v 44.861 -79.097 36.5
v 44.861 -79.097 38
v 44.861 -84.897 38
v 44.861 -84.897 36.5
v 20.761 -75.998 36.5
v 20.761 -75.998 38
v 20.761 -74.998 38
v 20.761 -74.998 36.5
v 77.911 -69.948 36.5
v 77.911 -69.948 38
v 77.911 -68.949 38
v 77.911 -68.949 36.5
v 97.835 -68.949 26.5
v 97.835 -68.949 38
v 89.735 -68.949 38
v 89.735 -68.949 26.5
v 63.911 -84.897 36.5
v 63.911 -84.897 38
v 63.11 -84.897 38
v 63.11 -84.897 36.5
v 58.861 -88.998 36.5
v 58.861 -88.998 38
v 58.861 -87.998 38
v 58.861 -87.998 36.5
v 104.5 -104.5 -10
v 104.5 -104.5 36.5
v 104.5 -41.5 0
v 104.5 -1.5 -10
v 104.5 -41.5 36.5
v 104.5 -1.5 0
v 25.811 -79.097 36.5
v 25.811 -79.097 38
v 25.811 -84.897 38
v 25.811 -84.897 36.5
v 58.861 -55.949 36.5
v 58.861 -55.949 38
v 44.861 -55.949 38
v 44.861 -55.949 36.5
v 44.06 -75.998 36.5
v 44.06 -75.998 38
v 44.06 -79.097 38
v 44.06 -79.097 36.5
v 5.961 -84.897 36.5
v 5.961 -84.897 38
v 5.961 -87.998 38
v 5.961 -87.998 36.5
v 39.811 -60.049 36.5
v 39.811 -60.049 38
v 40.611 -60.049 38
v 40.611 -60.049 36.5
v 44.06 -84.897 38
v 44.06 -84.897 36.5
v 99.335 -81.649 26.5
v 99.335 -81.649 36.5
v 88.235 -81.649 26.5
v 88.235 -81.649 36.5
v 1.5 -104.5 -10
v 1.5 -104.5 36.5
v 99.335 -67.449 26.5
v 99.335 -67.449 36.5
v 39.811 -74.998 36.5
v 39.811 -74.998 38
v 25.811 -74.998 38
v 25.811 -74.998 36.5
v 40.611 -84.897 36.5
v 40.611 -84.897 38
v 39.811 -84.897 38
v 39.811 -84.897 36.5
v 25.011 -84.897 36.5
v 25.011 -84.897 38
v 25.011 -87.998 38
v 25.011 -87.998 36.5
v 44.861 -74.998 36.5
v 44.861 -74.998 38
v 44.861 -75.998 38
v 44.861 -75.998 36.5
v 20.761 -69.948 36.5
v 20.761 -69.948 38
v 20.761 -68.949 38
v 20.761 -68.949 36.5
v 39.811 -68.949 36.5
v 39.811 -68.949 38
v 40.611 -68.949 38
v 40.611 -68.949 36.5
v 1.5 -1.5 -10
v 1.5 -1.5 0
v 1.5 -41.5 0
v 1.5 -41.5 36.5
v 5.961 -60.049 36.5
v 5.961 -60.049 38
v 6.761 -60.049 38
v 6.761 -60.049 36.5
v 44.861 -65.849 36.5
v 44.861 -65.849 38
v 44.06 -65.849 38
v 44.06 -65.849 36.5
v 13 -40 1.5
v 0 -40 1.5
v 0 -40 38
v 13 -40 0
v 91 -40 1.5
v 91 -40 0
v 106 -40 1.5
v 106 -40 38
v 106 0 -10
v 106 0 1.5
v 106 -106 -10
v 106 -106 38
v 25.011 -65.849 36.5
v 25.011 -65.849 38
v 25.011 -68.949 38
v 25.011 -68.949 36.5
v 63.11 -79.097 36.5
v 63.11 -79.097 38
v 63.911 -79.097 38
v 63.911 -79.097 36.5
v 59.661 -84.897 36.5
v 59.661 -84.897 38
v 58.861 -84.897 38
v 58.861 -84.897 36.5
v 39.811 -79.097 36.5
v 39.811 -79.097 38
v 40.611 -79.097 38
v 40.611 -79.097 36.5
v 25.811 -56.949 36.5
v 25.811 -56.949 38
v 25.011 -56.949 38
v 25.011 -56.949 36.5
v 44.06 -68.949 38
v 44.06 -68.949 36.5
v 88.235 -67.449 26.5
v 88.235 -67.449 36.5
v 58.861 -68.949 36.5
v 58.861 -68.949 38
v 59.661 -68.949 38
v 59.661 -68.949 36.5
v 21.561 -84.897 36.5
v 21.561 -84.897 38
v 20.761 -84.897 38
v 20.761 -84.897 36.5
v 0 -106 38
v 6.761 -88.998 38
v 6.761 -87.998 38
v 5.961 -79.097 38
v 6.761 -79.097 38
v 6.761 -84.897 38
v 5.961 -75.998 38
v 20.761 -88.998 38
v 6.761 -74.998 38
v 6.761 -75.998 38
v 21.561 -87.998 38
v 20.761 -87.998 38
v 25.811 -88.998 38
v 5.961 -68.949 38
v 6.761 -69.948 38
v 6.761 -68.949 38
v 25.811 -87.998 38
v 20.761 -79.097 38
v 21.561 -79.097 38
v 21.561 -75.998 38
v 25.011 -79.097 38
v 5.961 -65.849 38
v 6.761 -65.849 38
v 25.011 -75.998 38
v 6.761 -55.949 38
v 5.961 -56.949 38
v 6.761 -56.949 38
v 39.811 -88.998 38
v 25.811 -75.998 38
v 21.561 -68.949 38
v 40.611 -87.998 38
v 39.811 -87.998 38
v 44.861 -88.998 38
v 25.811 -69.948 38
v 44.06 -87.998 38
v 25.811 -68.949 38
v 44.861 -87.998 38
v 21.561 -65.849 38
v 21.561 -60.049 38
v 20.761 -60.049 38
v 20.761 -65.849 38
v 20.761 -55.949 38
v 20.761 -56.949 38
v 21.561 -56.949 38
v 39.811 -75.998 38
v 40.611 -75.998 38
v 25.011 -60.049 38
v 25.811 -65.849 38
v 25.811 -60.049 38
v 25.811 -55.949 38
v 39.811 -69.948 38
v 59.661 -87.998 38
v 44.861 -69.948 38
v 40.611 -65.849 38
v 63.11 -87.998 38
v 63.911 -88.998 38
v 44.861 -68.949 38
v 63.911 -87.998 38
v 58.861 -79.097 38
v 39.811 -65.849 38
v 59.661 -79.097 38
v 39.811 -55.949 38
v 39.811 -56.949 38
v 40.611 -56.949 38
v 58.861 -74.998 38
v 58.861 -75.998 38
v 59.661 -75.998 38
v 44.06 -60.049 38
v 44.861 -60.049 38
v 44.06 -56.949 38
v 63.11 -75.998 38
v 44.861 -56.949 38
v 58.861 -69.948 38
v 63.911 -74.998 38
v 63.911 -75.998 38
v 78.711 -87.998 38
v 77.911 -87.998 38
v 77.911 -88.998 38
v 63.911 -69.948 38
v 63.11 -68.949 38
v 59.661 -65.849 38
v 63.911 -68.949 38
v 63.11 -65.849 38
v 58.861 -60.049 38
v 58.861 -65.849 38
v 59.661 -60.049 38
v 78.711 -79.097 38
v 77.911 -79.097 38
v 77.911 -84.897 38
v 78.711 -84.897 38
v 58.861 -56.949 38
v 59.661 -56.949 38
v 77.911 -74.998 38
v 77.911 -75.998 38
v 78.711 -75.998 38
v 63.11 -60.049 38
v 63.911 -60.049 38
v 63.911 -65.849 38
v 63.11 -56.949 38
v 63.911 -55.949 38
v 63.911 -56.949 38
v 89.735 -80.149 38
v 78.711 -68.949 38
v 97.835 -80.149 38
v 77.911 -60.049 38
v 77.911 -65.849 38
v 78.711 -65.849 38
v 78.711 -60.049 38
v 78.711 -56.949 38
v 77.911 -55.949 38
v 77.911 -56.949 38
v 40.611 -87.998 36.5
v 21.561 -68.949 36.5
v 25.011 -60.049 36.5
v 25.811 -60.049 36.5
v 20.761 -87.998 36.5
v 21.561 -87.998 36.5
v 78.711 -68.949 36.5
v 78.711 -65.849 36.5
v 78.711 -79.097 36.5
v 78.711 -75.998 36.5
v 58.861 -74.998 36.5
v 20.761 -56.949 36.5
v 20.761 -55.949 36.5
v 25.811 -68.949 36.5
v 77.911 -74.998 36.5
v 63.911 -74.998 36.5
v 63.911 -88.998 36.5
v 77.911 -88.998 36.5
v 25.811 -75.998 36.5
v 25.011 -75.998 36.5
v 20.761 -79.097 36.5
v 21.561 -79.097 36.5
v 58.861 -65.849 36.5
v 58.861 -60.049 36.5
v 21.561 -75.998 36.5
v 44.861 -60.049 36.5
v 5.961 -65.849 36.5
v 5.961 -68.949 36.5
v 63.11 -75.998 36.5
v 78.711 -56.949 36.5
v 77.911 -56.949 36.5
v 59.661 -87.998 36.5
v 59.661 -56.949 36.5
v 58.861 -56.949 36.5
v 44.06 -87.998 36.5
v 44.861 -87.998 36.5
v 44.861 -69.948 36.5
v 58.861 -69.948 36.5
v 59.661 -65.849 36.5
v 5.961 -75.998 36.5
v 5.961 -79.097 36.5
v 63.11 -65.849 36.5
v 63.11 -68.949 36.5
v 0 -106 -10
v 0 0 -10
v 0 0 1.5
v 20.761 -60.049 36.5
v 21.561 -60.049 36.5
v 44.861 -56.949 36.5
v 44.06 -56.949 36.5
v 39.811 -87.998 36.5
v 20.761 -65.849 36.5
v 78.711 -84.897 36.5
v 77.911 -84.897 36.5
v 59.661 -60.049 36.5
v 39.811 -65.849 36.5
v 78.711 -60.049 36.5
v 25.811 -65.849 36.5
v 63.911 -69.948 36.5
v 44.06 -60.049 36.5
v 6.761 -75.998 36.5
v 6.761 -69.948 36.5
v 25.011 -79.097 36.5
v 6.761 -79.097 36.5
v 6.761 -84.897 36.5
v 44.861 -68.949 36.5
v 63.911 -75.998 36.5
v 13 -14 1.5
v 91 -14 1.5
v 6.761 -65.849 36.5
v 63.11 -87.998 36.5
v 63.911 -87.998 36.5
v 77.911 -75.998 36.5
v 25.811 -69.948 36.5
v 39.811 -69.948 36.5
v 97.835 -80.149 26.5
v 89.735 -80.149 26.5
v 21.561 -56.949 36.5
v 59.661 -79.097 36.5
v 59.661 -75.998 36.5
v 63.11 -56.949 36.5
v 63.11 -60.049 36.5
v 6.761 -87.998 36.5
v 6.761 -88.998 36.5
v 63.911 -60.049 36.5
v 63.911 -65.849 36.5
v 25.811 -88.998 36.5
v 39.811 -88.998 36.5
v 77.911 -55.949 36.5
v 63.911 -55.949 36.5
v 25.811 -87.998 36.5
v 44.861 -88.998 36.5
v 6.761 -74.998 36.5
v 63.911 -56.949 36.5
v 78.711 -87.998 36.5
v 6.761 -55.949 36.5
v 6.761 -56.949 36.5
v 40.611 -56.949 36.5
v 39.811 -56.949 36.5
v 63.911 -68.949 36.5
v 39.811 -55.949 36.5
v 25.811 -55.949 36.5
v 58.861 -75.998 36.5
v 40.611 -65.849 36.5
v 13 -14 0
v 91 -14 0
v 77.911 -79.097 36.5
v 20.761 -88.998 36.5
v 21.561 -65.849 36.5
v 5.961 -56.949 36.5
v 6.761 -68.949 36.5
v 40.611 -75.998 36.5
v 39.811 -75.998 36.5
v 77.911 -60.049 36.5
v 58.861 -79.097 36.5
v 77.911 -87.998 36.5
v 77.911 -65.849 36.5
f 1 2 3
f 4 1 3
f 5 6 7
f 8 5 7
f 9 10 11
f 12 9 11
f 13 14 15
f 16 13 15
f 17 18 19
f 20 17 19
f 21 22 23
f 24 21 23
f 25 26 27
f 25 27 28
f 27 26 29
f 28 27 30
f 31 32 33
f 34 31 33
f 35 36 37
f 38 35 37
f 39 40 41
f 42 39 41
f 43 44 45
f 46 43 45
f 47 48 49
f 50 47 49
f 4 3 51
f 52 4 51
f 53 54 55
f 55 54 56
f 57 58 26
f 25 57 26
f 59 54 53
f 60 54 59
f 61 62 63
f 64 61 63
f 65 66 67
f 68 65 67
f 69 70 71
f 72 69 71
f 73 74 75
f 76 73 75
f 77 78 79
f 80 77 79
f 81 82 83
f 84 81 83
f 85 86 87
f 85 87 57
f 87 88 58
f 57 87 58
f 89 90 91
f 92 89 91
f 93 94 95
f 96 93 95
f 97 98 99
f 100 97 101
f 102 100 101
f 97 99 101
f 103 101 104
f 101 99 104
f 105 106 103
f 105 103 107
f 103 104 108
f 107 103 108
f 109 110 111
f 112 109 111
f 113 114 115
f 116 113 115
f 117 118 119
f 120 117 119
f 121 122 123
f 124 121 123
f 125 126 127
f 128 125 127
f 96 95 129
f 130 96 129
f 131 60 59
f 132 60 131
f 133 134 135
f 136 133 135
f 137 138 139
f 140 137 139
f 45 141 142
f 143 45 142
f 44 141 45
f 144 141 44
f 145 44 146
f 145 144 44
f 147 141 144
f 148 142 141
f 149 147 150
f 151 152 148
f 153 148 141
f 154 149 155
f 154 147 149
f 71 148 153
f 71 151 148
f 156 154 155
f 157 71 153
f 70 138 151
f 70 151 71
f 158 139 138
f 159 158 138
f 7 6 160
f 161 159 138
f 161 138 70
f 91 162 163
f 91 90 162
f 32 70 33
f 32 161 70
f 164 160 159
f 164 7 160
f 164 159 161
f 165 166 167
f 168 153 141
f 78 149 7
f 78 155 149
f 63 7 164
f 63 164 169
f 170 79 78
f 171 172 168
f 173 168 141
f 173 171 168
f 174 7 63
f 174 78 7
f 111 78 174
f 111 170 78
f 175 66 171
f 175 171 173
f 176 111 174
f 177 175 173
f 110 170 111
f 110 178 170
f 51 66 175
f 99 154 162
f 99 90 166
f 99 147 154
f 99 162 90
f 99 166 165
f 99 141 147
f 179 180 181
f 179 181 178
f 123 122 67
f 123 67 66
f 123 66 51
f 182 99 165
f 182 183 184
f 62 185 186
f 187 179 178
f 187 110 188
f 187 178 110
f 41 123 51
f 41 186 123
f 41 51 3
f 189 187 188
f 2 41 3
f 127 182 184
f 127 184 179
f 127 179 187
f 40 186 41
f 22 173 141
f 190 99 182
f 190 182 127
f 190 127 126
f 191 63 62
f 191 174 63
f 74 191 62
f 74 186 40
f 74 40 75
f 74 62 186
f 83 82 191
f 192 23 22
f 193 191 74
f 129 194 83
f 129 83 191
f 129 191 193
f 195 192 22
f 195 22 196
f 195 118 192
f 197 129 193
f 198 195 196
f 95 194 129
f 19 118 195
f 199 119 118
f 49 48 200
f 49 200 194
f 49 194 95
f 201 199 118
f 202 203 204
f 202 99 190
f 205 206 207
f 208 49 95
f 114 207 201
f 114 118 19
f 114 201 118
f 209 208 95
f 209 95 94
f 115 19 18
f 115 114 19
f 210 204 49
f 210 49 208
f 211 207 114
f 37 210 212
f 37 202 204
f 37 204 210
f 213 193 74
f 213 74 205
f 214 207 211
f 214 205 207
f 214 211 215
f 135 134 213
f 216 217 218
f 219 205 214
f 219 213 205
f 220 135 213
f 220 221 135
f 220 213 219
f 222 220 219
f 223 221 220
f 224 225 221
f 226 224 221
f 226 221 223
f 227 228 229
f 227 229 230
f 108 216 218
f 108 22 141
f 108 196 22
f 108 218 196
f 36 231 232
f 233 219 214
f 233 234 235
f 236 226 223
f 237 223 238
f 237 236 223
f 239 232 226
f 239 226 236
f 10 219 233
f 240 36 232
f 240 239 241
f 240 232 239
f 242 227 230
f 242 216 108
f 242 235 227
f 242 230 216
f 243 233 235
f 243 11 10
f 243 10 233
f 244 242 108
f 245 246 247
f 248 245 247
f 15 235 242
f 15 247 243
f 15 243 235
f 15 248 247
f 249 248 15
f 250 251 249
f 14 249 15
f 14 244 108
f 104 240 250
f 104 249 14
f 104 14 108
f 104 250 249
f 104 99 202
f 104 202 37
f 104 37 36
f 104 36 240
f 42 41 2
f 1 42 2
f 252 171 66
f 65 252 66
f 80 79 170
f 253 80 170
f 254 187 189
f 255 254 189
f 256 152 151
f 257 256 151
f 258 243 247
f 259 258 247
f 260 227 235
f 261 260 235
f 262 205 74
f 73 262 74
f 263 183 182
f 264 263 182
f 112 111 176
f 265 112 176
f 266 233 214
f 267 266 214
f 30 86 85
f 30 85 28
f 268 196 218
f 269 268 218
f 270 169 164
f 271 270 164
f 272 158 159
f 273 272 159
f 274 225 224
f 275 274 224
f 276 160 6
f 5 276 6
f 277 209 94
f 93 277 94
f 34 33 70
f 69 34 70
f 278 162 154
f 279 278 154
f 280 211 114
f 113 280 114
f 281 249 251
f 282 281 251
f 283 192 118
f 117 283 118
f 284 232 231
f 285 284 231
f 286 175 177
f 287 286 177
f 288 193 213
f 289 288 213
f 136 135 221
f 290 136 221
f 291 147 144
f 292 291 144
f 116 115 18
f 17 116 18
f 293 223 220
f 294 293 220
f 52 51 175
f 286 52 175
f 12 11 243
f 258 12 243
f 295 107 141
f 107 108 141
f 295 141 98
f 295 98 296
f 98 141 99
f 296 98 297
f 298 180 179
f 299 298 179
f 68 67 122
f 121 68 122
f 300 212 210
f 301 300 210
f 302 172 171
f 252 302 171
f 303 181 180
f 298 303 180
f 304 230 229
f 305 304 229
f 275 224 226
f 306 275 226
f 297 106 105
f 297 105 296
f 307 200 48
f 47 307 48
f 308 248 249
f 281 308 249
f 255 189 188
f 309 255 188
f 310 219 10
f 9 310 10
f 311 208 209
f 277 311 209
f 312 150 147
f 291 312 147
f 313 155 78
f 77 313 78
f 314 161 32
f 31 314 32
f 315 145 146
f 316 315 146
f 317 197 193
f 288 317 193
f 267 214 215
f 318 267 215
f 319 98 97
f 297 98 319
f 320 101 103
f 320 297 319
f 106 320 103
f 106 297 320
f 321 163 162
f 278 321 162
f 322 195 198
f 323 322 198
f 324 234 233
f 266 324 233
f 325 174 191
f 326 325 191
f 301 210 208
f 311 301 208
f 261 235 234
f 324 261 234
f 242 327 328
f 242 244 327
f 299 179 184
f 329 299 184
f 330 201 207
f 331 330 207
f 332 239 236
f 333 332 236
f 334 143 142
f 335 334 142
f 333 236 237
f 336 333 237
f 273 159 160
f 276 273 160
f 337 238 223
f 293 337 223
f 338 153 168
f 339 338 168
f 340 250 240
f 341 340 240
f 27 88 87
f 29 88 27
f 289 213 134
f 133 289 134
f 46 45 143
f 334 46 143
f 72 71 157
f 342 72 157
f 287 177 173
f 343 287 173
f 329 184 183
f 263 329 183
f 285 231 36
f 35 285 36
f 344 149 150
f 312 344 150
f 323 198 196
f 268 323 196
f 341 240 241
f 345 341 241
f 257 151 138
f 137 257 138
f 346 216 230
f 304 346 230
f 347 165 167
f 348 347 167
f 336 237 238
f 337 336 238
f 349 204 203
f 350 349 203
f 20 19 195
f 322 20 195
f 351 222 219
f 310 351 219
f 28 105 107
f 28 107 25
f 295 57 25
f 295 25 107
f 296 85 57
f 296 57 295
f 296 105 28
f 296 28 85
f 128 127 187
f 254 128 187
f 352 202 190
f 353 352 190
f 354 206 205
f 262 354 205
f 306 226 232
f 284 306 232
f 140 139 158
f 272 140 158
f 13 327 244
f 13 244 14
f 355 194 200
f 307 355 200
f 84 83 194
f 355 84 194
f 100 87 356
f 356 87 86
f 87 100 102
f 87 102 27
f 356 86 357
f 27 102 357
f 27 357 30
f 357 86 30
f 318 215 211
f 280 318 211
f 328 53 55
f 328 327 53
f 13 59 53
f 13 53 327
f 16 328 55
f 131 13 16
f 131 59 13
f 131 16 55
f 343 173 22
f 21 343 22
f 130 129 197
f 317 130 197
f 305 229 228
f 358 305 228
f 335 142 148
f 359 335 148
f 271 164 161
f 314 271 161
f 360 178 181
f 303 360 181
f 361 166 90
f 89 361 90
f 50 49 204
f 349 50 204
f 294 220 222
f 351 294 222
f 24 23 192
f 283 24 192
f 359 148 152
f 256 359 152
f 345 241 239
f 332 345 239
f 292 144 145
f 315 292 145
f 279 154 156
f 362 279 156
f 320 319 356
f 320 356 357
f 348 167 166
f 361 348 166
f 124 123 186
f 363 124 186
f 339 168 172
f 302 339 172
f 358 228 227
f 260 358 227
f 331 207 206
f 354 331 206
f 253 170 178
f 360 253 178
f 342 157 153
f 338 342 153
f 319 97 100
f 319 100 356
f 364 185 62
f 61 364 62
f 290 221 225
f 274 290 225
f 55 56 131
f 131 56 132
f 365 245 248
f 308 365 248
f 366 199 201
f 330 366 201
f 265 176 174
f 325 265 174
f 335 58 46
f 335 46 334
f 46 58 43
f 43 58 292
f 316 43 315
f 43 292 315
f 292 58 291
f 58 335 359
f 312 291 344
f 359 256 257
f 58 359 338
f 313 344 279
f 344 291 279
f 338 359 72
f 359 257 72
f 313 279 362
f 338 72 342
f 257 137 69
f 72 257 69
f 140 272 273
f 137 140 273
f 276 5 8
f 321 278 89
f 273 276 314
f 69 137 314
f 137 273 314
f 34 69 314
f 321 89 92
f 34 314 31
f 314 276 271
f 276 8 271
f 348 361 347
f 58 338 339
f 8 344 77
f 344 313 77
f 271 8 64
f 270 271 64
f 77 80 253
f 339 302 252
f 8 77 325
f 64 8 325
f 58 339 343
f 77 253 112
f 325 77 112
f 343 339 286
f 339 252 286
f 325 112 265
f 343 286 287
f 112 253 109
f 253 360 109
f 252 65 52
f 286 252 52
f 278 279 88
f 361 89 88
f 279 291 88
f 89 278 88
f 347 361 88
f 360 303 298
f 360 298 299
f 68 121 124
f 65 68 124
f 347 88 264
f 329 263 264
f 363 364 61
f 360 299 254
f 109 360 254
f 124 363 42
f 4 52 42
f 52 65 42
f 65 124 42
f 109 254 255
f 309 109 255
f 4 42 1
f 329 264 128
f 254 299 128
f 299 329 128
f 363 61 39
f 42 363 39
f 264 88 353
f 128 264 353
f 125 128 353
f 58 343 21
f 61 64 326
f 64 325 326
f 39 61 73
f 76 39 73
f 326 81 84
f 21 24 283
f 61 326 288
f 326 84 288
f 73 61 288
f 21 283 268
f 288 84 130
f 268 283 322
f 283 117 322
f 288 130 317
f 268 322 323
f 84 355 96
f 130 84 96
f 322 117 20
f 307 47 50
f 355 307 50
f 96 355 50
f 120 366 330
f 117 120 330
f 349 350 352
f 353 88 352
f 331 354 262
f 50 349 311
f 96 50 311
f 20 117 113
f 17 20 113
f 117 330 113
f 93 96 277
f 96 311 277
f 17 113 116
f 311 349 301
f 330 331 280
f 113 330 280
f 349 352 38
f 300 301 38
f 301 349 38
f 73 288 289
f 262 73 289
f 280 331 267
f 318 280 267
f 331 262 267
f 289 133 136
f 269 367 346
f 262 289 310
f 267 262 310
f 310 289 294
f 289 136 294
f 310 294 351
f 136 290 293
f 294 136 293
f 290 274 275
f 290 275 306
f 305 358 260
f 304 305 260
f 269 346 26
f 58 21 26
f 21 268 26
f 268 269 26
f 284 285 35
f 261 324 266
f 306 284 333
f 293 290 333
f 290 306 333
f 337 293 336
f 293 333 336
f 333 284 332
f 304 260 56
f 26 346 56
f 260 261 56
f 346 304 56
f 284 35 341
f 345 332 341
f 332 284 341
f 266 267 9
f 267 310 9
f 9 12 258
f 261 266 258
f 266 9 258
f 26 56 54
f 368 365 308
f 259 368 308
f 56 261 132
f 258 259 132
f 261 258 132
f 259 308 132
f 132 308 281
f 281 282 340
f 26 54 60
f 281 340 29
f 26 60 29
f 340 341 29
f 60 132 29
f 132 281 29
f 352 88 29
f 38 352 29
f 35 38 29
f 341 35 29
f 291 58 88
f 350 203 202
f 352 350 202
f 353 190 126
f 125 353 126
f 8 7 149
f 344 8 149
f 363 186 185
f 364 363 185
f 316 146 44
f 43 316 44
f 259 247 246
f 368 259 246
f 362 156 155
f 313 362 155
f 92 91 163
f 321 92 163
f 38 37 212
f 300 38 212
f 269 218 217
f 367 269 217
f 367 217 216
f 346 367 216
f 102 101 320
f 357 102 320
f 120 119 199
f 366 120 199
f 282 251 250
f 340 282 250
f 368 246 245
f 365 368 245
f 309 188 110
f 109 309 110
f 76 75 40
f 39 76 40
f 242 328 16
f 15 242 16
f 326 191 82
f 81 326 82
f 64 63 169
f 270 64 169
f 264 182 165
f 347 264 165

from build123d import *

# Parameters (mm, degrees)
SKETCH_1_W          = 106
SKETCH_1_H          = 40
EXTRUDE_1_DEPTH     = 1.5
SKETCH_5_W          = 106
SKETCH_5_H          = 36.5
EXTRUDE_4_DEPTH     = 1.5
SKETCH_6_W          = 106
SKETCH_6_H          = 66
EXTRUDE_5_DEPTH     = 1.5
EXTRUDE_6_DEPTH     = 10
EXTRUDE_7_DEPTH     = 46.5
SKETCH_11_W         = 8.1
SKETCH_11_H         = 11.2
CUT_EXTRUDE_1_DEPTH = 1.5
SKETCH_12_W         = 11.1
SKETCH_12_H         = 14.2
SKETCH_12_W_2       = 8.1
SKETCH_12_H_2       = 11.2
EXTRUDE_8_DEPTH     = 10
SKETCH_13_W         = 78
SKETCH_13_H         = 26
CUT_EXTRUDE_2_DEPTH = 1.5


with BuildPart() as part:
    # 草图1 → 凸台-拉伸1 (new body)
    with BuildSketch(Plane.XY):
        with Locations((53, -20)):
            Rectangle(SKETCH_1_W, SKETCH_1_H)
    extrude(amount=EXTRUDE_1_DEPTH)

    # 草图5 → 凸台-拉伸4 (add)
    with BuildSketch(Plane.XZ.offset(40)):
        with Locations((53, 18.25)):
            Rectangle(SKETCH_5_W, SKETCH_5_H)
    extrude(amount=EXTRUDE_4_DEPTH)

    # 草图6 → 凸台-拉伸5 (add)
    with BuildSketch(Plane.XY.offset(36.5)):
        with Locations((53, -73)):
            Rectangle(SKETCH_6_W, SKETCH_6_H)
    extrude(amount=EXTRUDE_5_DEPTH)

    # 草图7 → 凸台-拉伸6 (add)
    with BuildSketch(Plane(origin=(0, 0, 0), x_dir=(-1, 0, 0), z_dir=(0, 0, -1))):
        Polygon((-106, -41.5), (-106, 0), (0, 0), (0, -41.5), (-1.5, -41.5), (-1.5, -1.5), (-104.5, -1.5), (-104.5, -41.5), align=None)
    extrude(amount=EXTRUDE_6_DEPTH)

    # 草图8 → 凸台-拉伸7 (add)
    with BuildSketch(Plane(origin=(0, 0, 36.5), x_dir=(-1, 0, 0), z_dir=(0, 0, -1))):
        Polygon((-106, -41.5), (-106, -106), (0, -106), (0, -41.5), (-1.5, -41.5), (-1.5, -104.5), (-104.5, -104.5), (-104.5, -41.5), align=None)
    extrude(amount=EXTRUDE_7_DEPTH)

    # 草图11 → 切除-拉伸1 (cut)
    with BuildSketch(Plane.XY.offset(38)):
        Polygon((63.911237552, -74.99759487), (63.911237552, -75.99809487), (63.110437552, -75.99809487), (63.110437552, -79.09729487), (63.911237552, -79.09729487), (63.911237552, -84.89729487), (63.110437552, -84.89729487), (63.110437552, -87.99789487), (63.911237552, -87.99789487), (63.911237552, -88.99829487), (77.910537552, -88.99829487), (77.910537552, -87.99789487), (78.711337552, -87.99789487), (78.711337552, -84.89729487), (77.910537552, -84.89729487), (77.910537552, -79.09729487), (78.711337552, -79.09729487), (78.711337552, -75.99809487), (77.910537552, -75.99809487), (77.910537552, -74.99759487), align=None)
        Polygon((44.861237552, -74.99759487), (44.861237552, -75.99809487), (44.060437552, -75.99809487), (44.060437552, -79.09729487), (44.861237552, -79.09729487), (44.861237552, -84.89729487), (44.060437552, -84.89729487), (44.060437552, -87.99789487), (44.861237552, -87.99789487), (44.861237552, -88.99829487), (58.860537552, -88.99829487), (58.860537552, -87.99789487), (59.661337552, -87.99789487), (59.661337552, -84.89729487), (58.860537552, -84.89729487), (58.860537552, -79.09729487), (59.661337552, -79.09729487), (59.661337552, -75.99809487), (58.860537552, -75.99809487), (58.860537552, -74.99759487), align=None)
        Polygon((25.811237552, -74.99759487), (25.811237552, -75.99809487), (25.010537552, -75.99809487), (25.010537552, -79.09729487), (25.811237552, -79.09729487), (25.811237552, -84.89729487), (25.010537552, -84.89729487), (25.010537552, -87.99789487), (25.811237552, -87.99789487), (25.811237552, -88.99829487), (39.810537552, -88.99829487), (39.810537552, -87.99789487), (40.611337552, -87.99789487), (40.611337552, -84.89729487), (39.810537552, -84.89729487), (39.810537552, -79.09729487), (40.611337552, -79.09729487), (40.611337552, -75.99809487), (39.810537552, -75.99809487), (39.810537552, -74.99759487), align=None)
        Polygon((6.761187552, -74.99759487), (6.761187552, -75.99809487), (5.960547552, -75.99809487), (5.960547552, -79.09729487), (6.761187552, -79.09729487), (6.761187552, -84.89729487), (5.960547552, -84.89729487), (5.960547552, -87.99789487), (6.761187552, -87.99789487), (6.761187552, -88.99829487), (20.760737552, -88.99829487), (20.760737552, -87.99789487), (21.561337552, -87.99789487), (21.561337552, -84.89729487), (20.760737552, -84.89729487), (20.760737552, -79.09729487), (21.561337552, -79.09729487), (21.561337552, -75.99809487), (20.760737552, -75.99809487), (20.760737552, -74.99759487), align=None)
        Polygon((63.911237552, -55.94899487), (63.911237552, -56.94949487), (63.110437552, -56.94949487), (63.110437552, -60.04869487), (63.911237552, -60.04869487), (63.911237552, -65.84869487), (63.110437552, -65.84869487), (63.110437552, -68.94929487), (63.911237552, -68.94929487), (63.911237552, -69.94829487), (77.910537552, -69.94829487), (77.910537552, -68.94929487), (78.711337552, -68.94929487), (78.711337552, -65.84869487), (77.910537552, -65.84869487), (77.910537552, -60.04869487), (78.711337552, -60.04869487), (78.711337552, -56.94949487), (77.910537552, -56.94949487), (77.910537552, -55.94899487), align=None)
        Polygon((44.861237552, -55.94899487), (44.861237552, -56.94949487), (44.060437552, -56.94949487), (44.060437552, -60.04869487), (44.861237552, -60.04869487), (44.861237552, -65.84869487), (44.060437552, -65.84869487), (44.060437552, -68.94929487), (44.861237552, -68.94929487), (44.861237552, -69.94829487), (58.860537552, -69.94829487), (58.860537552, -68.94929487), (59.661337552, -68.94929487), (59.661337552, -65.84869487), (58.860537552, -65.84869487), (58.860537552, -60.04869487), (59.661337552, -60.04869487), (59.661337552, -56.94949487), (58.860537552, -56.94949487), (58.860537552, -55.94899487), align=None)
        Polygon((25.811237552, -55.94899487), (25.811237552, -56.94949487), (25.010537552, -56.94949487), (25.010537552, -60.04869487), (25.811237552, -60.04869487), (25.811237552, -65.84869487), (25.010537552, -65.84869487), (25.010537552, -68.94929487), (25.811237552, -68.94929487), (25.811237552, -69.94829487), (39.810537552, -69.94829487), (39.810537552, -68.94929487), (40.611337552, -68.94929487), (40.611337552, -65.84869487), (39.810537552, -65.84869487), (39.810537552, -60.04869487), (40.611337552, -60.04869487), (40.611337552, -56.94949487), (39.810537552, -56.94949487), (39.810537552, -55.94899487), align=None)
        Polygon((6.761187552, -55.94899487), (6.761187552, -56.94949487), (5.960547552, -56.94949487), (5.960547552, -60.04869487), (6.761187552, -60.04869487), (6.761187552, -65.84869487), (5.960547552, -65.84869487), (5.960547552, -68.94929487), (6.761187552, -68.94929487), (6.761187552, -69.94829487), (20.760737552, -69.94829487), (20.760737552, -68.94929487), (21.561337552, -68.94929487), (21.561337552, -65.84869487), (20.760737552, -65.84869487), (20.760737552, -60.04869487), (21.561337552, -60.04869487), (21.561337552, -56.94949487), (20.760737552, -56.94949487), (20.760737552, -55.94899487), align=None)
        with Locations((93.785079963, -74.54929487)):
            Rectangle(SKETCH_11_W, SKETCH_11_H)
    extrude(amount=-CUT_EXTRUDE_1_DEPTH, mode=Mode.SUBTRACT)

    # 草图12 → 凸台-拉伸8 (add)
    with BuildSketch(Plane(origin=(0, 0, 36.5), x_dir=(-1, 0, 0), z_dir=(0, 0, -1))):
        with Locations((-93.785079963, -74.54929487)):
            Rectangle(SKETCH_12_W, SKETCH_12_H)
        with Locations((-93.785079963, -74.54929487)):
            Rectangle(SKETCH_12_W_2, SKETCH_12_H_2, mode=Mode.SUBTRACT)
    extrude(amount=EXTRUDE_8_DEPTH)

    # 草图13 → 切除-拉伸2 (cut)
    with BuildSketch(Plane.XY.offset(1.5)):
        with Locations((52, -27)):
            Rectangle(SKETCH_13_W, SKETCH_13_H)
    extrude(amount=-CUT_EXTRUDE_2_DEPTH, mode=Mode.SUBTRACT)


solid = part.part
